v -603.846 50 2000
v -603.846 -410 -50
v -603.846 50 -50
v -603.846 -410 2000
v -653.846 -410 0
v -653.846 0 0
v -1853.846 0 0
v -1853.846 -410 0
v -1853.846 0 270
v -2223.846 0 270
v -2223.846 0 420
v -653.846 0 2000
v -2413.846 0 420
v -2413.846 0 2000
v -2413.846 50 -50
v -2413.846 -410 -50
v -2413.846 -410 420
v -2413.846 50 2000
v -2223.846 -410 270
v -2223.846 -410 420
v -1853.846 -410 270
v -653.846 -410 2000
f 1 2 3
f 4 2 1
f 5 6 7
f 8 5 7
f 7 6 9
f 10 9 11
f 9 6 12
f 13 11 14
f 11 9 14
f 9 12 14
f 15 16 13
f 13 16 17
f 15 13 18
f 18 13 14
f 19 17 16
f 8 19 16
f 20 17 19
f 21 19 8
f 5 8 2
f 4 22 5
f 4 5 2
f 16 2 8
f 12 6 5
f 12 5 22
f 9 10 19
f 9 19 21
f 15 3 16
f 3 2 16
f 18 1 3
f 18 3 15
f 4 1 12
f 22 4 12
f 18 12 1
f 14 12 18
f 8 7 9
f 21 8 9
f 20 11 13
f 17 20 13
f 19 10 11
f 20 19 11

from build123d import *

# Parameters (mm, degrees)
F0_W     = 370
F0_H     = 270
F0_W_2   = 50
F0_H_2   = 2000
F1_DEPTH = 410
F2_W     = 1810
F2_H     = 2050
F3_DEPTH = 50


with BuildPart() as f1:
    # F0 (on Front) → F1 (new body)
    with BuildSketch(Plane.XZ):
        Polygon((-1853.846294, 0), (-2223.846294, 0), (-2413.846294, 0), (-2413.846294, -50), (-603.846294, -50), (-603.846294, 0), (-653.846294, 0), align=None)
        Polygon((-2413.846294, 0), (-2223.846294, 0), (-2223.846294, 270), (-2223.846294, 420), (-2413.846294, 420), align=None)
        with Locations((-2038.846294, 135)):
            Rectangle(F0_W, F0_H)
        with Locations((-628.846294, 1000)):
            Rectangle(F0_W_2, F0_H_2)
    extrude(amount=F1_DEPTH)

    # F2 (on face) → F3 (join)
    with BuildSketch(Plane(origin=(0, 0, 0), x_dir=(-1, 0, 0), z_dir=(0, 1, 0))):
        with Locations((1508.846294, 975)):
            Rectangle(F2_W, F2_H)
    extrude(amount=F3_DEPTH)


solid = f1.part
